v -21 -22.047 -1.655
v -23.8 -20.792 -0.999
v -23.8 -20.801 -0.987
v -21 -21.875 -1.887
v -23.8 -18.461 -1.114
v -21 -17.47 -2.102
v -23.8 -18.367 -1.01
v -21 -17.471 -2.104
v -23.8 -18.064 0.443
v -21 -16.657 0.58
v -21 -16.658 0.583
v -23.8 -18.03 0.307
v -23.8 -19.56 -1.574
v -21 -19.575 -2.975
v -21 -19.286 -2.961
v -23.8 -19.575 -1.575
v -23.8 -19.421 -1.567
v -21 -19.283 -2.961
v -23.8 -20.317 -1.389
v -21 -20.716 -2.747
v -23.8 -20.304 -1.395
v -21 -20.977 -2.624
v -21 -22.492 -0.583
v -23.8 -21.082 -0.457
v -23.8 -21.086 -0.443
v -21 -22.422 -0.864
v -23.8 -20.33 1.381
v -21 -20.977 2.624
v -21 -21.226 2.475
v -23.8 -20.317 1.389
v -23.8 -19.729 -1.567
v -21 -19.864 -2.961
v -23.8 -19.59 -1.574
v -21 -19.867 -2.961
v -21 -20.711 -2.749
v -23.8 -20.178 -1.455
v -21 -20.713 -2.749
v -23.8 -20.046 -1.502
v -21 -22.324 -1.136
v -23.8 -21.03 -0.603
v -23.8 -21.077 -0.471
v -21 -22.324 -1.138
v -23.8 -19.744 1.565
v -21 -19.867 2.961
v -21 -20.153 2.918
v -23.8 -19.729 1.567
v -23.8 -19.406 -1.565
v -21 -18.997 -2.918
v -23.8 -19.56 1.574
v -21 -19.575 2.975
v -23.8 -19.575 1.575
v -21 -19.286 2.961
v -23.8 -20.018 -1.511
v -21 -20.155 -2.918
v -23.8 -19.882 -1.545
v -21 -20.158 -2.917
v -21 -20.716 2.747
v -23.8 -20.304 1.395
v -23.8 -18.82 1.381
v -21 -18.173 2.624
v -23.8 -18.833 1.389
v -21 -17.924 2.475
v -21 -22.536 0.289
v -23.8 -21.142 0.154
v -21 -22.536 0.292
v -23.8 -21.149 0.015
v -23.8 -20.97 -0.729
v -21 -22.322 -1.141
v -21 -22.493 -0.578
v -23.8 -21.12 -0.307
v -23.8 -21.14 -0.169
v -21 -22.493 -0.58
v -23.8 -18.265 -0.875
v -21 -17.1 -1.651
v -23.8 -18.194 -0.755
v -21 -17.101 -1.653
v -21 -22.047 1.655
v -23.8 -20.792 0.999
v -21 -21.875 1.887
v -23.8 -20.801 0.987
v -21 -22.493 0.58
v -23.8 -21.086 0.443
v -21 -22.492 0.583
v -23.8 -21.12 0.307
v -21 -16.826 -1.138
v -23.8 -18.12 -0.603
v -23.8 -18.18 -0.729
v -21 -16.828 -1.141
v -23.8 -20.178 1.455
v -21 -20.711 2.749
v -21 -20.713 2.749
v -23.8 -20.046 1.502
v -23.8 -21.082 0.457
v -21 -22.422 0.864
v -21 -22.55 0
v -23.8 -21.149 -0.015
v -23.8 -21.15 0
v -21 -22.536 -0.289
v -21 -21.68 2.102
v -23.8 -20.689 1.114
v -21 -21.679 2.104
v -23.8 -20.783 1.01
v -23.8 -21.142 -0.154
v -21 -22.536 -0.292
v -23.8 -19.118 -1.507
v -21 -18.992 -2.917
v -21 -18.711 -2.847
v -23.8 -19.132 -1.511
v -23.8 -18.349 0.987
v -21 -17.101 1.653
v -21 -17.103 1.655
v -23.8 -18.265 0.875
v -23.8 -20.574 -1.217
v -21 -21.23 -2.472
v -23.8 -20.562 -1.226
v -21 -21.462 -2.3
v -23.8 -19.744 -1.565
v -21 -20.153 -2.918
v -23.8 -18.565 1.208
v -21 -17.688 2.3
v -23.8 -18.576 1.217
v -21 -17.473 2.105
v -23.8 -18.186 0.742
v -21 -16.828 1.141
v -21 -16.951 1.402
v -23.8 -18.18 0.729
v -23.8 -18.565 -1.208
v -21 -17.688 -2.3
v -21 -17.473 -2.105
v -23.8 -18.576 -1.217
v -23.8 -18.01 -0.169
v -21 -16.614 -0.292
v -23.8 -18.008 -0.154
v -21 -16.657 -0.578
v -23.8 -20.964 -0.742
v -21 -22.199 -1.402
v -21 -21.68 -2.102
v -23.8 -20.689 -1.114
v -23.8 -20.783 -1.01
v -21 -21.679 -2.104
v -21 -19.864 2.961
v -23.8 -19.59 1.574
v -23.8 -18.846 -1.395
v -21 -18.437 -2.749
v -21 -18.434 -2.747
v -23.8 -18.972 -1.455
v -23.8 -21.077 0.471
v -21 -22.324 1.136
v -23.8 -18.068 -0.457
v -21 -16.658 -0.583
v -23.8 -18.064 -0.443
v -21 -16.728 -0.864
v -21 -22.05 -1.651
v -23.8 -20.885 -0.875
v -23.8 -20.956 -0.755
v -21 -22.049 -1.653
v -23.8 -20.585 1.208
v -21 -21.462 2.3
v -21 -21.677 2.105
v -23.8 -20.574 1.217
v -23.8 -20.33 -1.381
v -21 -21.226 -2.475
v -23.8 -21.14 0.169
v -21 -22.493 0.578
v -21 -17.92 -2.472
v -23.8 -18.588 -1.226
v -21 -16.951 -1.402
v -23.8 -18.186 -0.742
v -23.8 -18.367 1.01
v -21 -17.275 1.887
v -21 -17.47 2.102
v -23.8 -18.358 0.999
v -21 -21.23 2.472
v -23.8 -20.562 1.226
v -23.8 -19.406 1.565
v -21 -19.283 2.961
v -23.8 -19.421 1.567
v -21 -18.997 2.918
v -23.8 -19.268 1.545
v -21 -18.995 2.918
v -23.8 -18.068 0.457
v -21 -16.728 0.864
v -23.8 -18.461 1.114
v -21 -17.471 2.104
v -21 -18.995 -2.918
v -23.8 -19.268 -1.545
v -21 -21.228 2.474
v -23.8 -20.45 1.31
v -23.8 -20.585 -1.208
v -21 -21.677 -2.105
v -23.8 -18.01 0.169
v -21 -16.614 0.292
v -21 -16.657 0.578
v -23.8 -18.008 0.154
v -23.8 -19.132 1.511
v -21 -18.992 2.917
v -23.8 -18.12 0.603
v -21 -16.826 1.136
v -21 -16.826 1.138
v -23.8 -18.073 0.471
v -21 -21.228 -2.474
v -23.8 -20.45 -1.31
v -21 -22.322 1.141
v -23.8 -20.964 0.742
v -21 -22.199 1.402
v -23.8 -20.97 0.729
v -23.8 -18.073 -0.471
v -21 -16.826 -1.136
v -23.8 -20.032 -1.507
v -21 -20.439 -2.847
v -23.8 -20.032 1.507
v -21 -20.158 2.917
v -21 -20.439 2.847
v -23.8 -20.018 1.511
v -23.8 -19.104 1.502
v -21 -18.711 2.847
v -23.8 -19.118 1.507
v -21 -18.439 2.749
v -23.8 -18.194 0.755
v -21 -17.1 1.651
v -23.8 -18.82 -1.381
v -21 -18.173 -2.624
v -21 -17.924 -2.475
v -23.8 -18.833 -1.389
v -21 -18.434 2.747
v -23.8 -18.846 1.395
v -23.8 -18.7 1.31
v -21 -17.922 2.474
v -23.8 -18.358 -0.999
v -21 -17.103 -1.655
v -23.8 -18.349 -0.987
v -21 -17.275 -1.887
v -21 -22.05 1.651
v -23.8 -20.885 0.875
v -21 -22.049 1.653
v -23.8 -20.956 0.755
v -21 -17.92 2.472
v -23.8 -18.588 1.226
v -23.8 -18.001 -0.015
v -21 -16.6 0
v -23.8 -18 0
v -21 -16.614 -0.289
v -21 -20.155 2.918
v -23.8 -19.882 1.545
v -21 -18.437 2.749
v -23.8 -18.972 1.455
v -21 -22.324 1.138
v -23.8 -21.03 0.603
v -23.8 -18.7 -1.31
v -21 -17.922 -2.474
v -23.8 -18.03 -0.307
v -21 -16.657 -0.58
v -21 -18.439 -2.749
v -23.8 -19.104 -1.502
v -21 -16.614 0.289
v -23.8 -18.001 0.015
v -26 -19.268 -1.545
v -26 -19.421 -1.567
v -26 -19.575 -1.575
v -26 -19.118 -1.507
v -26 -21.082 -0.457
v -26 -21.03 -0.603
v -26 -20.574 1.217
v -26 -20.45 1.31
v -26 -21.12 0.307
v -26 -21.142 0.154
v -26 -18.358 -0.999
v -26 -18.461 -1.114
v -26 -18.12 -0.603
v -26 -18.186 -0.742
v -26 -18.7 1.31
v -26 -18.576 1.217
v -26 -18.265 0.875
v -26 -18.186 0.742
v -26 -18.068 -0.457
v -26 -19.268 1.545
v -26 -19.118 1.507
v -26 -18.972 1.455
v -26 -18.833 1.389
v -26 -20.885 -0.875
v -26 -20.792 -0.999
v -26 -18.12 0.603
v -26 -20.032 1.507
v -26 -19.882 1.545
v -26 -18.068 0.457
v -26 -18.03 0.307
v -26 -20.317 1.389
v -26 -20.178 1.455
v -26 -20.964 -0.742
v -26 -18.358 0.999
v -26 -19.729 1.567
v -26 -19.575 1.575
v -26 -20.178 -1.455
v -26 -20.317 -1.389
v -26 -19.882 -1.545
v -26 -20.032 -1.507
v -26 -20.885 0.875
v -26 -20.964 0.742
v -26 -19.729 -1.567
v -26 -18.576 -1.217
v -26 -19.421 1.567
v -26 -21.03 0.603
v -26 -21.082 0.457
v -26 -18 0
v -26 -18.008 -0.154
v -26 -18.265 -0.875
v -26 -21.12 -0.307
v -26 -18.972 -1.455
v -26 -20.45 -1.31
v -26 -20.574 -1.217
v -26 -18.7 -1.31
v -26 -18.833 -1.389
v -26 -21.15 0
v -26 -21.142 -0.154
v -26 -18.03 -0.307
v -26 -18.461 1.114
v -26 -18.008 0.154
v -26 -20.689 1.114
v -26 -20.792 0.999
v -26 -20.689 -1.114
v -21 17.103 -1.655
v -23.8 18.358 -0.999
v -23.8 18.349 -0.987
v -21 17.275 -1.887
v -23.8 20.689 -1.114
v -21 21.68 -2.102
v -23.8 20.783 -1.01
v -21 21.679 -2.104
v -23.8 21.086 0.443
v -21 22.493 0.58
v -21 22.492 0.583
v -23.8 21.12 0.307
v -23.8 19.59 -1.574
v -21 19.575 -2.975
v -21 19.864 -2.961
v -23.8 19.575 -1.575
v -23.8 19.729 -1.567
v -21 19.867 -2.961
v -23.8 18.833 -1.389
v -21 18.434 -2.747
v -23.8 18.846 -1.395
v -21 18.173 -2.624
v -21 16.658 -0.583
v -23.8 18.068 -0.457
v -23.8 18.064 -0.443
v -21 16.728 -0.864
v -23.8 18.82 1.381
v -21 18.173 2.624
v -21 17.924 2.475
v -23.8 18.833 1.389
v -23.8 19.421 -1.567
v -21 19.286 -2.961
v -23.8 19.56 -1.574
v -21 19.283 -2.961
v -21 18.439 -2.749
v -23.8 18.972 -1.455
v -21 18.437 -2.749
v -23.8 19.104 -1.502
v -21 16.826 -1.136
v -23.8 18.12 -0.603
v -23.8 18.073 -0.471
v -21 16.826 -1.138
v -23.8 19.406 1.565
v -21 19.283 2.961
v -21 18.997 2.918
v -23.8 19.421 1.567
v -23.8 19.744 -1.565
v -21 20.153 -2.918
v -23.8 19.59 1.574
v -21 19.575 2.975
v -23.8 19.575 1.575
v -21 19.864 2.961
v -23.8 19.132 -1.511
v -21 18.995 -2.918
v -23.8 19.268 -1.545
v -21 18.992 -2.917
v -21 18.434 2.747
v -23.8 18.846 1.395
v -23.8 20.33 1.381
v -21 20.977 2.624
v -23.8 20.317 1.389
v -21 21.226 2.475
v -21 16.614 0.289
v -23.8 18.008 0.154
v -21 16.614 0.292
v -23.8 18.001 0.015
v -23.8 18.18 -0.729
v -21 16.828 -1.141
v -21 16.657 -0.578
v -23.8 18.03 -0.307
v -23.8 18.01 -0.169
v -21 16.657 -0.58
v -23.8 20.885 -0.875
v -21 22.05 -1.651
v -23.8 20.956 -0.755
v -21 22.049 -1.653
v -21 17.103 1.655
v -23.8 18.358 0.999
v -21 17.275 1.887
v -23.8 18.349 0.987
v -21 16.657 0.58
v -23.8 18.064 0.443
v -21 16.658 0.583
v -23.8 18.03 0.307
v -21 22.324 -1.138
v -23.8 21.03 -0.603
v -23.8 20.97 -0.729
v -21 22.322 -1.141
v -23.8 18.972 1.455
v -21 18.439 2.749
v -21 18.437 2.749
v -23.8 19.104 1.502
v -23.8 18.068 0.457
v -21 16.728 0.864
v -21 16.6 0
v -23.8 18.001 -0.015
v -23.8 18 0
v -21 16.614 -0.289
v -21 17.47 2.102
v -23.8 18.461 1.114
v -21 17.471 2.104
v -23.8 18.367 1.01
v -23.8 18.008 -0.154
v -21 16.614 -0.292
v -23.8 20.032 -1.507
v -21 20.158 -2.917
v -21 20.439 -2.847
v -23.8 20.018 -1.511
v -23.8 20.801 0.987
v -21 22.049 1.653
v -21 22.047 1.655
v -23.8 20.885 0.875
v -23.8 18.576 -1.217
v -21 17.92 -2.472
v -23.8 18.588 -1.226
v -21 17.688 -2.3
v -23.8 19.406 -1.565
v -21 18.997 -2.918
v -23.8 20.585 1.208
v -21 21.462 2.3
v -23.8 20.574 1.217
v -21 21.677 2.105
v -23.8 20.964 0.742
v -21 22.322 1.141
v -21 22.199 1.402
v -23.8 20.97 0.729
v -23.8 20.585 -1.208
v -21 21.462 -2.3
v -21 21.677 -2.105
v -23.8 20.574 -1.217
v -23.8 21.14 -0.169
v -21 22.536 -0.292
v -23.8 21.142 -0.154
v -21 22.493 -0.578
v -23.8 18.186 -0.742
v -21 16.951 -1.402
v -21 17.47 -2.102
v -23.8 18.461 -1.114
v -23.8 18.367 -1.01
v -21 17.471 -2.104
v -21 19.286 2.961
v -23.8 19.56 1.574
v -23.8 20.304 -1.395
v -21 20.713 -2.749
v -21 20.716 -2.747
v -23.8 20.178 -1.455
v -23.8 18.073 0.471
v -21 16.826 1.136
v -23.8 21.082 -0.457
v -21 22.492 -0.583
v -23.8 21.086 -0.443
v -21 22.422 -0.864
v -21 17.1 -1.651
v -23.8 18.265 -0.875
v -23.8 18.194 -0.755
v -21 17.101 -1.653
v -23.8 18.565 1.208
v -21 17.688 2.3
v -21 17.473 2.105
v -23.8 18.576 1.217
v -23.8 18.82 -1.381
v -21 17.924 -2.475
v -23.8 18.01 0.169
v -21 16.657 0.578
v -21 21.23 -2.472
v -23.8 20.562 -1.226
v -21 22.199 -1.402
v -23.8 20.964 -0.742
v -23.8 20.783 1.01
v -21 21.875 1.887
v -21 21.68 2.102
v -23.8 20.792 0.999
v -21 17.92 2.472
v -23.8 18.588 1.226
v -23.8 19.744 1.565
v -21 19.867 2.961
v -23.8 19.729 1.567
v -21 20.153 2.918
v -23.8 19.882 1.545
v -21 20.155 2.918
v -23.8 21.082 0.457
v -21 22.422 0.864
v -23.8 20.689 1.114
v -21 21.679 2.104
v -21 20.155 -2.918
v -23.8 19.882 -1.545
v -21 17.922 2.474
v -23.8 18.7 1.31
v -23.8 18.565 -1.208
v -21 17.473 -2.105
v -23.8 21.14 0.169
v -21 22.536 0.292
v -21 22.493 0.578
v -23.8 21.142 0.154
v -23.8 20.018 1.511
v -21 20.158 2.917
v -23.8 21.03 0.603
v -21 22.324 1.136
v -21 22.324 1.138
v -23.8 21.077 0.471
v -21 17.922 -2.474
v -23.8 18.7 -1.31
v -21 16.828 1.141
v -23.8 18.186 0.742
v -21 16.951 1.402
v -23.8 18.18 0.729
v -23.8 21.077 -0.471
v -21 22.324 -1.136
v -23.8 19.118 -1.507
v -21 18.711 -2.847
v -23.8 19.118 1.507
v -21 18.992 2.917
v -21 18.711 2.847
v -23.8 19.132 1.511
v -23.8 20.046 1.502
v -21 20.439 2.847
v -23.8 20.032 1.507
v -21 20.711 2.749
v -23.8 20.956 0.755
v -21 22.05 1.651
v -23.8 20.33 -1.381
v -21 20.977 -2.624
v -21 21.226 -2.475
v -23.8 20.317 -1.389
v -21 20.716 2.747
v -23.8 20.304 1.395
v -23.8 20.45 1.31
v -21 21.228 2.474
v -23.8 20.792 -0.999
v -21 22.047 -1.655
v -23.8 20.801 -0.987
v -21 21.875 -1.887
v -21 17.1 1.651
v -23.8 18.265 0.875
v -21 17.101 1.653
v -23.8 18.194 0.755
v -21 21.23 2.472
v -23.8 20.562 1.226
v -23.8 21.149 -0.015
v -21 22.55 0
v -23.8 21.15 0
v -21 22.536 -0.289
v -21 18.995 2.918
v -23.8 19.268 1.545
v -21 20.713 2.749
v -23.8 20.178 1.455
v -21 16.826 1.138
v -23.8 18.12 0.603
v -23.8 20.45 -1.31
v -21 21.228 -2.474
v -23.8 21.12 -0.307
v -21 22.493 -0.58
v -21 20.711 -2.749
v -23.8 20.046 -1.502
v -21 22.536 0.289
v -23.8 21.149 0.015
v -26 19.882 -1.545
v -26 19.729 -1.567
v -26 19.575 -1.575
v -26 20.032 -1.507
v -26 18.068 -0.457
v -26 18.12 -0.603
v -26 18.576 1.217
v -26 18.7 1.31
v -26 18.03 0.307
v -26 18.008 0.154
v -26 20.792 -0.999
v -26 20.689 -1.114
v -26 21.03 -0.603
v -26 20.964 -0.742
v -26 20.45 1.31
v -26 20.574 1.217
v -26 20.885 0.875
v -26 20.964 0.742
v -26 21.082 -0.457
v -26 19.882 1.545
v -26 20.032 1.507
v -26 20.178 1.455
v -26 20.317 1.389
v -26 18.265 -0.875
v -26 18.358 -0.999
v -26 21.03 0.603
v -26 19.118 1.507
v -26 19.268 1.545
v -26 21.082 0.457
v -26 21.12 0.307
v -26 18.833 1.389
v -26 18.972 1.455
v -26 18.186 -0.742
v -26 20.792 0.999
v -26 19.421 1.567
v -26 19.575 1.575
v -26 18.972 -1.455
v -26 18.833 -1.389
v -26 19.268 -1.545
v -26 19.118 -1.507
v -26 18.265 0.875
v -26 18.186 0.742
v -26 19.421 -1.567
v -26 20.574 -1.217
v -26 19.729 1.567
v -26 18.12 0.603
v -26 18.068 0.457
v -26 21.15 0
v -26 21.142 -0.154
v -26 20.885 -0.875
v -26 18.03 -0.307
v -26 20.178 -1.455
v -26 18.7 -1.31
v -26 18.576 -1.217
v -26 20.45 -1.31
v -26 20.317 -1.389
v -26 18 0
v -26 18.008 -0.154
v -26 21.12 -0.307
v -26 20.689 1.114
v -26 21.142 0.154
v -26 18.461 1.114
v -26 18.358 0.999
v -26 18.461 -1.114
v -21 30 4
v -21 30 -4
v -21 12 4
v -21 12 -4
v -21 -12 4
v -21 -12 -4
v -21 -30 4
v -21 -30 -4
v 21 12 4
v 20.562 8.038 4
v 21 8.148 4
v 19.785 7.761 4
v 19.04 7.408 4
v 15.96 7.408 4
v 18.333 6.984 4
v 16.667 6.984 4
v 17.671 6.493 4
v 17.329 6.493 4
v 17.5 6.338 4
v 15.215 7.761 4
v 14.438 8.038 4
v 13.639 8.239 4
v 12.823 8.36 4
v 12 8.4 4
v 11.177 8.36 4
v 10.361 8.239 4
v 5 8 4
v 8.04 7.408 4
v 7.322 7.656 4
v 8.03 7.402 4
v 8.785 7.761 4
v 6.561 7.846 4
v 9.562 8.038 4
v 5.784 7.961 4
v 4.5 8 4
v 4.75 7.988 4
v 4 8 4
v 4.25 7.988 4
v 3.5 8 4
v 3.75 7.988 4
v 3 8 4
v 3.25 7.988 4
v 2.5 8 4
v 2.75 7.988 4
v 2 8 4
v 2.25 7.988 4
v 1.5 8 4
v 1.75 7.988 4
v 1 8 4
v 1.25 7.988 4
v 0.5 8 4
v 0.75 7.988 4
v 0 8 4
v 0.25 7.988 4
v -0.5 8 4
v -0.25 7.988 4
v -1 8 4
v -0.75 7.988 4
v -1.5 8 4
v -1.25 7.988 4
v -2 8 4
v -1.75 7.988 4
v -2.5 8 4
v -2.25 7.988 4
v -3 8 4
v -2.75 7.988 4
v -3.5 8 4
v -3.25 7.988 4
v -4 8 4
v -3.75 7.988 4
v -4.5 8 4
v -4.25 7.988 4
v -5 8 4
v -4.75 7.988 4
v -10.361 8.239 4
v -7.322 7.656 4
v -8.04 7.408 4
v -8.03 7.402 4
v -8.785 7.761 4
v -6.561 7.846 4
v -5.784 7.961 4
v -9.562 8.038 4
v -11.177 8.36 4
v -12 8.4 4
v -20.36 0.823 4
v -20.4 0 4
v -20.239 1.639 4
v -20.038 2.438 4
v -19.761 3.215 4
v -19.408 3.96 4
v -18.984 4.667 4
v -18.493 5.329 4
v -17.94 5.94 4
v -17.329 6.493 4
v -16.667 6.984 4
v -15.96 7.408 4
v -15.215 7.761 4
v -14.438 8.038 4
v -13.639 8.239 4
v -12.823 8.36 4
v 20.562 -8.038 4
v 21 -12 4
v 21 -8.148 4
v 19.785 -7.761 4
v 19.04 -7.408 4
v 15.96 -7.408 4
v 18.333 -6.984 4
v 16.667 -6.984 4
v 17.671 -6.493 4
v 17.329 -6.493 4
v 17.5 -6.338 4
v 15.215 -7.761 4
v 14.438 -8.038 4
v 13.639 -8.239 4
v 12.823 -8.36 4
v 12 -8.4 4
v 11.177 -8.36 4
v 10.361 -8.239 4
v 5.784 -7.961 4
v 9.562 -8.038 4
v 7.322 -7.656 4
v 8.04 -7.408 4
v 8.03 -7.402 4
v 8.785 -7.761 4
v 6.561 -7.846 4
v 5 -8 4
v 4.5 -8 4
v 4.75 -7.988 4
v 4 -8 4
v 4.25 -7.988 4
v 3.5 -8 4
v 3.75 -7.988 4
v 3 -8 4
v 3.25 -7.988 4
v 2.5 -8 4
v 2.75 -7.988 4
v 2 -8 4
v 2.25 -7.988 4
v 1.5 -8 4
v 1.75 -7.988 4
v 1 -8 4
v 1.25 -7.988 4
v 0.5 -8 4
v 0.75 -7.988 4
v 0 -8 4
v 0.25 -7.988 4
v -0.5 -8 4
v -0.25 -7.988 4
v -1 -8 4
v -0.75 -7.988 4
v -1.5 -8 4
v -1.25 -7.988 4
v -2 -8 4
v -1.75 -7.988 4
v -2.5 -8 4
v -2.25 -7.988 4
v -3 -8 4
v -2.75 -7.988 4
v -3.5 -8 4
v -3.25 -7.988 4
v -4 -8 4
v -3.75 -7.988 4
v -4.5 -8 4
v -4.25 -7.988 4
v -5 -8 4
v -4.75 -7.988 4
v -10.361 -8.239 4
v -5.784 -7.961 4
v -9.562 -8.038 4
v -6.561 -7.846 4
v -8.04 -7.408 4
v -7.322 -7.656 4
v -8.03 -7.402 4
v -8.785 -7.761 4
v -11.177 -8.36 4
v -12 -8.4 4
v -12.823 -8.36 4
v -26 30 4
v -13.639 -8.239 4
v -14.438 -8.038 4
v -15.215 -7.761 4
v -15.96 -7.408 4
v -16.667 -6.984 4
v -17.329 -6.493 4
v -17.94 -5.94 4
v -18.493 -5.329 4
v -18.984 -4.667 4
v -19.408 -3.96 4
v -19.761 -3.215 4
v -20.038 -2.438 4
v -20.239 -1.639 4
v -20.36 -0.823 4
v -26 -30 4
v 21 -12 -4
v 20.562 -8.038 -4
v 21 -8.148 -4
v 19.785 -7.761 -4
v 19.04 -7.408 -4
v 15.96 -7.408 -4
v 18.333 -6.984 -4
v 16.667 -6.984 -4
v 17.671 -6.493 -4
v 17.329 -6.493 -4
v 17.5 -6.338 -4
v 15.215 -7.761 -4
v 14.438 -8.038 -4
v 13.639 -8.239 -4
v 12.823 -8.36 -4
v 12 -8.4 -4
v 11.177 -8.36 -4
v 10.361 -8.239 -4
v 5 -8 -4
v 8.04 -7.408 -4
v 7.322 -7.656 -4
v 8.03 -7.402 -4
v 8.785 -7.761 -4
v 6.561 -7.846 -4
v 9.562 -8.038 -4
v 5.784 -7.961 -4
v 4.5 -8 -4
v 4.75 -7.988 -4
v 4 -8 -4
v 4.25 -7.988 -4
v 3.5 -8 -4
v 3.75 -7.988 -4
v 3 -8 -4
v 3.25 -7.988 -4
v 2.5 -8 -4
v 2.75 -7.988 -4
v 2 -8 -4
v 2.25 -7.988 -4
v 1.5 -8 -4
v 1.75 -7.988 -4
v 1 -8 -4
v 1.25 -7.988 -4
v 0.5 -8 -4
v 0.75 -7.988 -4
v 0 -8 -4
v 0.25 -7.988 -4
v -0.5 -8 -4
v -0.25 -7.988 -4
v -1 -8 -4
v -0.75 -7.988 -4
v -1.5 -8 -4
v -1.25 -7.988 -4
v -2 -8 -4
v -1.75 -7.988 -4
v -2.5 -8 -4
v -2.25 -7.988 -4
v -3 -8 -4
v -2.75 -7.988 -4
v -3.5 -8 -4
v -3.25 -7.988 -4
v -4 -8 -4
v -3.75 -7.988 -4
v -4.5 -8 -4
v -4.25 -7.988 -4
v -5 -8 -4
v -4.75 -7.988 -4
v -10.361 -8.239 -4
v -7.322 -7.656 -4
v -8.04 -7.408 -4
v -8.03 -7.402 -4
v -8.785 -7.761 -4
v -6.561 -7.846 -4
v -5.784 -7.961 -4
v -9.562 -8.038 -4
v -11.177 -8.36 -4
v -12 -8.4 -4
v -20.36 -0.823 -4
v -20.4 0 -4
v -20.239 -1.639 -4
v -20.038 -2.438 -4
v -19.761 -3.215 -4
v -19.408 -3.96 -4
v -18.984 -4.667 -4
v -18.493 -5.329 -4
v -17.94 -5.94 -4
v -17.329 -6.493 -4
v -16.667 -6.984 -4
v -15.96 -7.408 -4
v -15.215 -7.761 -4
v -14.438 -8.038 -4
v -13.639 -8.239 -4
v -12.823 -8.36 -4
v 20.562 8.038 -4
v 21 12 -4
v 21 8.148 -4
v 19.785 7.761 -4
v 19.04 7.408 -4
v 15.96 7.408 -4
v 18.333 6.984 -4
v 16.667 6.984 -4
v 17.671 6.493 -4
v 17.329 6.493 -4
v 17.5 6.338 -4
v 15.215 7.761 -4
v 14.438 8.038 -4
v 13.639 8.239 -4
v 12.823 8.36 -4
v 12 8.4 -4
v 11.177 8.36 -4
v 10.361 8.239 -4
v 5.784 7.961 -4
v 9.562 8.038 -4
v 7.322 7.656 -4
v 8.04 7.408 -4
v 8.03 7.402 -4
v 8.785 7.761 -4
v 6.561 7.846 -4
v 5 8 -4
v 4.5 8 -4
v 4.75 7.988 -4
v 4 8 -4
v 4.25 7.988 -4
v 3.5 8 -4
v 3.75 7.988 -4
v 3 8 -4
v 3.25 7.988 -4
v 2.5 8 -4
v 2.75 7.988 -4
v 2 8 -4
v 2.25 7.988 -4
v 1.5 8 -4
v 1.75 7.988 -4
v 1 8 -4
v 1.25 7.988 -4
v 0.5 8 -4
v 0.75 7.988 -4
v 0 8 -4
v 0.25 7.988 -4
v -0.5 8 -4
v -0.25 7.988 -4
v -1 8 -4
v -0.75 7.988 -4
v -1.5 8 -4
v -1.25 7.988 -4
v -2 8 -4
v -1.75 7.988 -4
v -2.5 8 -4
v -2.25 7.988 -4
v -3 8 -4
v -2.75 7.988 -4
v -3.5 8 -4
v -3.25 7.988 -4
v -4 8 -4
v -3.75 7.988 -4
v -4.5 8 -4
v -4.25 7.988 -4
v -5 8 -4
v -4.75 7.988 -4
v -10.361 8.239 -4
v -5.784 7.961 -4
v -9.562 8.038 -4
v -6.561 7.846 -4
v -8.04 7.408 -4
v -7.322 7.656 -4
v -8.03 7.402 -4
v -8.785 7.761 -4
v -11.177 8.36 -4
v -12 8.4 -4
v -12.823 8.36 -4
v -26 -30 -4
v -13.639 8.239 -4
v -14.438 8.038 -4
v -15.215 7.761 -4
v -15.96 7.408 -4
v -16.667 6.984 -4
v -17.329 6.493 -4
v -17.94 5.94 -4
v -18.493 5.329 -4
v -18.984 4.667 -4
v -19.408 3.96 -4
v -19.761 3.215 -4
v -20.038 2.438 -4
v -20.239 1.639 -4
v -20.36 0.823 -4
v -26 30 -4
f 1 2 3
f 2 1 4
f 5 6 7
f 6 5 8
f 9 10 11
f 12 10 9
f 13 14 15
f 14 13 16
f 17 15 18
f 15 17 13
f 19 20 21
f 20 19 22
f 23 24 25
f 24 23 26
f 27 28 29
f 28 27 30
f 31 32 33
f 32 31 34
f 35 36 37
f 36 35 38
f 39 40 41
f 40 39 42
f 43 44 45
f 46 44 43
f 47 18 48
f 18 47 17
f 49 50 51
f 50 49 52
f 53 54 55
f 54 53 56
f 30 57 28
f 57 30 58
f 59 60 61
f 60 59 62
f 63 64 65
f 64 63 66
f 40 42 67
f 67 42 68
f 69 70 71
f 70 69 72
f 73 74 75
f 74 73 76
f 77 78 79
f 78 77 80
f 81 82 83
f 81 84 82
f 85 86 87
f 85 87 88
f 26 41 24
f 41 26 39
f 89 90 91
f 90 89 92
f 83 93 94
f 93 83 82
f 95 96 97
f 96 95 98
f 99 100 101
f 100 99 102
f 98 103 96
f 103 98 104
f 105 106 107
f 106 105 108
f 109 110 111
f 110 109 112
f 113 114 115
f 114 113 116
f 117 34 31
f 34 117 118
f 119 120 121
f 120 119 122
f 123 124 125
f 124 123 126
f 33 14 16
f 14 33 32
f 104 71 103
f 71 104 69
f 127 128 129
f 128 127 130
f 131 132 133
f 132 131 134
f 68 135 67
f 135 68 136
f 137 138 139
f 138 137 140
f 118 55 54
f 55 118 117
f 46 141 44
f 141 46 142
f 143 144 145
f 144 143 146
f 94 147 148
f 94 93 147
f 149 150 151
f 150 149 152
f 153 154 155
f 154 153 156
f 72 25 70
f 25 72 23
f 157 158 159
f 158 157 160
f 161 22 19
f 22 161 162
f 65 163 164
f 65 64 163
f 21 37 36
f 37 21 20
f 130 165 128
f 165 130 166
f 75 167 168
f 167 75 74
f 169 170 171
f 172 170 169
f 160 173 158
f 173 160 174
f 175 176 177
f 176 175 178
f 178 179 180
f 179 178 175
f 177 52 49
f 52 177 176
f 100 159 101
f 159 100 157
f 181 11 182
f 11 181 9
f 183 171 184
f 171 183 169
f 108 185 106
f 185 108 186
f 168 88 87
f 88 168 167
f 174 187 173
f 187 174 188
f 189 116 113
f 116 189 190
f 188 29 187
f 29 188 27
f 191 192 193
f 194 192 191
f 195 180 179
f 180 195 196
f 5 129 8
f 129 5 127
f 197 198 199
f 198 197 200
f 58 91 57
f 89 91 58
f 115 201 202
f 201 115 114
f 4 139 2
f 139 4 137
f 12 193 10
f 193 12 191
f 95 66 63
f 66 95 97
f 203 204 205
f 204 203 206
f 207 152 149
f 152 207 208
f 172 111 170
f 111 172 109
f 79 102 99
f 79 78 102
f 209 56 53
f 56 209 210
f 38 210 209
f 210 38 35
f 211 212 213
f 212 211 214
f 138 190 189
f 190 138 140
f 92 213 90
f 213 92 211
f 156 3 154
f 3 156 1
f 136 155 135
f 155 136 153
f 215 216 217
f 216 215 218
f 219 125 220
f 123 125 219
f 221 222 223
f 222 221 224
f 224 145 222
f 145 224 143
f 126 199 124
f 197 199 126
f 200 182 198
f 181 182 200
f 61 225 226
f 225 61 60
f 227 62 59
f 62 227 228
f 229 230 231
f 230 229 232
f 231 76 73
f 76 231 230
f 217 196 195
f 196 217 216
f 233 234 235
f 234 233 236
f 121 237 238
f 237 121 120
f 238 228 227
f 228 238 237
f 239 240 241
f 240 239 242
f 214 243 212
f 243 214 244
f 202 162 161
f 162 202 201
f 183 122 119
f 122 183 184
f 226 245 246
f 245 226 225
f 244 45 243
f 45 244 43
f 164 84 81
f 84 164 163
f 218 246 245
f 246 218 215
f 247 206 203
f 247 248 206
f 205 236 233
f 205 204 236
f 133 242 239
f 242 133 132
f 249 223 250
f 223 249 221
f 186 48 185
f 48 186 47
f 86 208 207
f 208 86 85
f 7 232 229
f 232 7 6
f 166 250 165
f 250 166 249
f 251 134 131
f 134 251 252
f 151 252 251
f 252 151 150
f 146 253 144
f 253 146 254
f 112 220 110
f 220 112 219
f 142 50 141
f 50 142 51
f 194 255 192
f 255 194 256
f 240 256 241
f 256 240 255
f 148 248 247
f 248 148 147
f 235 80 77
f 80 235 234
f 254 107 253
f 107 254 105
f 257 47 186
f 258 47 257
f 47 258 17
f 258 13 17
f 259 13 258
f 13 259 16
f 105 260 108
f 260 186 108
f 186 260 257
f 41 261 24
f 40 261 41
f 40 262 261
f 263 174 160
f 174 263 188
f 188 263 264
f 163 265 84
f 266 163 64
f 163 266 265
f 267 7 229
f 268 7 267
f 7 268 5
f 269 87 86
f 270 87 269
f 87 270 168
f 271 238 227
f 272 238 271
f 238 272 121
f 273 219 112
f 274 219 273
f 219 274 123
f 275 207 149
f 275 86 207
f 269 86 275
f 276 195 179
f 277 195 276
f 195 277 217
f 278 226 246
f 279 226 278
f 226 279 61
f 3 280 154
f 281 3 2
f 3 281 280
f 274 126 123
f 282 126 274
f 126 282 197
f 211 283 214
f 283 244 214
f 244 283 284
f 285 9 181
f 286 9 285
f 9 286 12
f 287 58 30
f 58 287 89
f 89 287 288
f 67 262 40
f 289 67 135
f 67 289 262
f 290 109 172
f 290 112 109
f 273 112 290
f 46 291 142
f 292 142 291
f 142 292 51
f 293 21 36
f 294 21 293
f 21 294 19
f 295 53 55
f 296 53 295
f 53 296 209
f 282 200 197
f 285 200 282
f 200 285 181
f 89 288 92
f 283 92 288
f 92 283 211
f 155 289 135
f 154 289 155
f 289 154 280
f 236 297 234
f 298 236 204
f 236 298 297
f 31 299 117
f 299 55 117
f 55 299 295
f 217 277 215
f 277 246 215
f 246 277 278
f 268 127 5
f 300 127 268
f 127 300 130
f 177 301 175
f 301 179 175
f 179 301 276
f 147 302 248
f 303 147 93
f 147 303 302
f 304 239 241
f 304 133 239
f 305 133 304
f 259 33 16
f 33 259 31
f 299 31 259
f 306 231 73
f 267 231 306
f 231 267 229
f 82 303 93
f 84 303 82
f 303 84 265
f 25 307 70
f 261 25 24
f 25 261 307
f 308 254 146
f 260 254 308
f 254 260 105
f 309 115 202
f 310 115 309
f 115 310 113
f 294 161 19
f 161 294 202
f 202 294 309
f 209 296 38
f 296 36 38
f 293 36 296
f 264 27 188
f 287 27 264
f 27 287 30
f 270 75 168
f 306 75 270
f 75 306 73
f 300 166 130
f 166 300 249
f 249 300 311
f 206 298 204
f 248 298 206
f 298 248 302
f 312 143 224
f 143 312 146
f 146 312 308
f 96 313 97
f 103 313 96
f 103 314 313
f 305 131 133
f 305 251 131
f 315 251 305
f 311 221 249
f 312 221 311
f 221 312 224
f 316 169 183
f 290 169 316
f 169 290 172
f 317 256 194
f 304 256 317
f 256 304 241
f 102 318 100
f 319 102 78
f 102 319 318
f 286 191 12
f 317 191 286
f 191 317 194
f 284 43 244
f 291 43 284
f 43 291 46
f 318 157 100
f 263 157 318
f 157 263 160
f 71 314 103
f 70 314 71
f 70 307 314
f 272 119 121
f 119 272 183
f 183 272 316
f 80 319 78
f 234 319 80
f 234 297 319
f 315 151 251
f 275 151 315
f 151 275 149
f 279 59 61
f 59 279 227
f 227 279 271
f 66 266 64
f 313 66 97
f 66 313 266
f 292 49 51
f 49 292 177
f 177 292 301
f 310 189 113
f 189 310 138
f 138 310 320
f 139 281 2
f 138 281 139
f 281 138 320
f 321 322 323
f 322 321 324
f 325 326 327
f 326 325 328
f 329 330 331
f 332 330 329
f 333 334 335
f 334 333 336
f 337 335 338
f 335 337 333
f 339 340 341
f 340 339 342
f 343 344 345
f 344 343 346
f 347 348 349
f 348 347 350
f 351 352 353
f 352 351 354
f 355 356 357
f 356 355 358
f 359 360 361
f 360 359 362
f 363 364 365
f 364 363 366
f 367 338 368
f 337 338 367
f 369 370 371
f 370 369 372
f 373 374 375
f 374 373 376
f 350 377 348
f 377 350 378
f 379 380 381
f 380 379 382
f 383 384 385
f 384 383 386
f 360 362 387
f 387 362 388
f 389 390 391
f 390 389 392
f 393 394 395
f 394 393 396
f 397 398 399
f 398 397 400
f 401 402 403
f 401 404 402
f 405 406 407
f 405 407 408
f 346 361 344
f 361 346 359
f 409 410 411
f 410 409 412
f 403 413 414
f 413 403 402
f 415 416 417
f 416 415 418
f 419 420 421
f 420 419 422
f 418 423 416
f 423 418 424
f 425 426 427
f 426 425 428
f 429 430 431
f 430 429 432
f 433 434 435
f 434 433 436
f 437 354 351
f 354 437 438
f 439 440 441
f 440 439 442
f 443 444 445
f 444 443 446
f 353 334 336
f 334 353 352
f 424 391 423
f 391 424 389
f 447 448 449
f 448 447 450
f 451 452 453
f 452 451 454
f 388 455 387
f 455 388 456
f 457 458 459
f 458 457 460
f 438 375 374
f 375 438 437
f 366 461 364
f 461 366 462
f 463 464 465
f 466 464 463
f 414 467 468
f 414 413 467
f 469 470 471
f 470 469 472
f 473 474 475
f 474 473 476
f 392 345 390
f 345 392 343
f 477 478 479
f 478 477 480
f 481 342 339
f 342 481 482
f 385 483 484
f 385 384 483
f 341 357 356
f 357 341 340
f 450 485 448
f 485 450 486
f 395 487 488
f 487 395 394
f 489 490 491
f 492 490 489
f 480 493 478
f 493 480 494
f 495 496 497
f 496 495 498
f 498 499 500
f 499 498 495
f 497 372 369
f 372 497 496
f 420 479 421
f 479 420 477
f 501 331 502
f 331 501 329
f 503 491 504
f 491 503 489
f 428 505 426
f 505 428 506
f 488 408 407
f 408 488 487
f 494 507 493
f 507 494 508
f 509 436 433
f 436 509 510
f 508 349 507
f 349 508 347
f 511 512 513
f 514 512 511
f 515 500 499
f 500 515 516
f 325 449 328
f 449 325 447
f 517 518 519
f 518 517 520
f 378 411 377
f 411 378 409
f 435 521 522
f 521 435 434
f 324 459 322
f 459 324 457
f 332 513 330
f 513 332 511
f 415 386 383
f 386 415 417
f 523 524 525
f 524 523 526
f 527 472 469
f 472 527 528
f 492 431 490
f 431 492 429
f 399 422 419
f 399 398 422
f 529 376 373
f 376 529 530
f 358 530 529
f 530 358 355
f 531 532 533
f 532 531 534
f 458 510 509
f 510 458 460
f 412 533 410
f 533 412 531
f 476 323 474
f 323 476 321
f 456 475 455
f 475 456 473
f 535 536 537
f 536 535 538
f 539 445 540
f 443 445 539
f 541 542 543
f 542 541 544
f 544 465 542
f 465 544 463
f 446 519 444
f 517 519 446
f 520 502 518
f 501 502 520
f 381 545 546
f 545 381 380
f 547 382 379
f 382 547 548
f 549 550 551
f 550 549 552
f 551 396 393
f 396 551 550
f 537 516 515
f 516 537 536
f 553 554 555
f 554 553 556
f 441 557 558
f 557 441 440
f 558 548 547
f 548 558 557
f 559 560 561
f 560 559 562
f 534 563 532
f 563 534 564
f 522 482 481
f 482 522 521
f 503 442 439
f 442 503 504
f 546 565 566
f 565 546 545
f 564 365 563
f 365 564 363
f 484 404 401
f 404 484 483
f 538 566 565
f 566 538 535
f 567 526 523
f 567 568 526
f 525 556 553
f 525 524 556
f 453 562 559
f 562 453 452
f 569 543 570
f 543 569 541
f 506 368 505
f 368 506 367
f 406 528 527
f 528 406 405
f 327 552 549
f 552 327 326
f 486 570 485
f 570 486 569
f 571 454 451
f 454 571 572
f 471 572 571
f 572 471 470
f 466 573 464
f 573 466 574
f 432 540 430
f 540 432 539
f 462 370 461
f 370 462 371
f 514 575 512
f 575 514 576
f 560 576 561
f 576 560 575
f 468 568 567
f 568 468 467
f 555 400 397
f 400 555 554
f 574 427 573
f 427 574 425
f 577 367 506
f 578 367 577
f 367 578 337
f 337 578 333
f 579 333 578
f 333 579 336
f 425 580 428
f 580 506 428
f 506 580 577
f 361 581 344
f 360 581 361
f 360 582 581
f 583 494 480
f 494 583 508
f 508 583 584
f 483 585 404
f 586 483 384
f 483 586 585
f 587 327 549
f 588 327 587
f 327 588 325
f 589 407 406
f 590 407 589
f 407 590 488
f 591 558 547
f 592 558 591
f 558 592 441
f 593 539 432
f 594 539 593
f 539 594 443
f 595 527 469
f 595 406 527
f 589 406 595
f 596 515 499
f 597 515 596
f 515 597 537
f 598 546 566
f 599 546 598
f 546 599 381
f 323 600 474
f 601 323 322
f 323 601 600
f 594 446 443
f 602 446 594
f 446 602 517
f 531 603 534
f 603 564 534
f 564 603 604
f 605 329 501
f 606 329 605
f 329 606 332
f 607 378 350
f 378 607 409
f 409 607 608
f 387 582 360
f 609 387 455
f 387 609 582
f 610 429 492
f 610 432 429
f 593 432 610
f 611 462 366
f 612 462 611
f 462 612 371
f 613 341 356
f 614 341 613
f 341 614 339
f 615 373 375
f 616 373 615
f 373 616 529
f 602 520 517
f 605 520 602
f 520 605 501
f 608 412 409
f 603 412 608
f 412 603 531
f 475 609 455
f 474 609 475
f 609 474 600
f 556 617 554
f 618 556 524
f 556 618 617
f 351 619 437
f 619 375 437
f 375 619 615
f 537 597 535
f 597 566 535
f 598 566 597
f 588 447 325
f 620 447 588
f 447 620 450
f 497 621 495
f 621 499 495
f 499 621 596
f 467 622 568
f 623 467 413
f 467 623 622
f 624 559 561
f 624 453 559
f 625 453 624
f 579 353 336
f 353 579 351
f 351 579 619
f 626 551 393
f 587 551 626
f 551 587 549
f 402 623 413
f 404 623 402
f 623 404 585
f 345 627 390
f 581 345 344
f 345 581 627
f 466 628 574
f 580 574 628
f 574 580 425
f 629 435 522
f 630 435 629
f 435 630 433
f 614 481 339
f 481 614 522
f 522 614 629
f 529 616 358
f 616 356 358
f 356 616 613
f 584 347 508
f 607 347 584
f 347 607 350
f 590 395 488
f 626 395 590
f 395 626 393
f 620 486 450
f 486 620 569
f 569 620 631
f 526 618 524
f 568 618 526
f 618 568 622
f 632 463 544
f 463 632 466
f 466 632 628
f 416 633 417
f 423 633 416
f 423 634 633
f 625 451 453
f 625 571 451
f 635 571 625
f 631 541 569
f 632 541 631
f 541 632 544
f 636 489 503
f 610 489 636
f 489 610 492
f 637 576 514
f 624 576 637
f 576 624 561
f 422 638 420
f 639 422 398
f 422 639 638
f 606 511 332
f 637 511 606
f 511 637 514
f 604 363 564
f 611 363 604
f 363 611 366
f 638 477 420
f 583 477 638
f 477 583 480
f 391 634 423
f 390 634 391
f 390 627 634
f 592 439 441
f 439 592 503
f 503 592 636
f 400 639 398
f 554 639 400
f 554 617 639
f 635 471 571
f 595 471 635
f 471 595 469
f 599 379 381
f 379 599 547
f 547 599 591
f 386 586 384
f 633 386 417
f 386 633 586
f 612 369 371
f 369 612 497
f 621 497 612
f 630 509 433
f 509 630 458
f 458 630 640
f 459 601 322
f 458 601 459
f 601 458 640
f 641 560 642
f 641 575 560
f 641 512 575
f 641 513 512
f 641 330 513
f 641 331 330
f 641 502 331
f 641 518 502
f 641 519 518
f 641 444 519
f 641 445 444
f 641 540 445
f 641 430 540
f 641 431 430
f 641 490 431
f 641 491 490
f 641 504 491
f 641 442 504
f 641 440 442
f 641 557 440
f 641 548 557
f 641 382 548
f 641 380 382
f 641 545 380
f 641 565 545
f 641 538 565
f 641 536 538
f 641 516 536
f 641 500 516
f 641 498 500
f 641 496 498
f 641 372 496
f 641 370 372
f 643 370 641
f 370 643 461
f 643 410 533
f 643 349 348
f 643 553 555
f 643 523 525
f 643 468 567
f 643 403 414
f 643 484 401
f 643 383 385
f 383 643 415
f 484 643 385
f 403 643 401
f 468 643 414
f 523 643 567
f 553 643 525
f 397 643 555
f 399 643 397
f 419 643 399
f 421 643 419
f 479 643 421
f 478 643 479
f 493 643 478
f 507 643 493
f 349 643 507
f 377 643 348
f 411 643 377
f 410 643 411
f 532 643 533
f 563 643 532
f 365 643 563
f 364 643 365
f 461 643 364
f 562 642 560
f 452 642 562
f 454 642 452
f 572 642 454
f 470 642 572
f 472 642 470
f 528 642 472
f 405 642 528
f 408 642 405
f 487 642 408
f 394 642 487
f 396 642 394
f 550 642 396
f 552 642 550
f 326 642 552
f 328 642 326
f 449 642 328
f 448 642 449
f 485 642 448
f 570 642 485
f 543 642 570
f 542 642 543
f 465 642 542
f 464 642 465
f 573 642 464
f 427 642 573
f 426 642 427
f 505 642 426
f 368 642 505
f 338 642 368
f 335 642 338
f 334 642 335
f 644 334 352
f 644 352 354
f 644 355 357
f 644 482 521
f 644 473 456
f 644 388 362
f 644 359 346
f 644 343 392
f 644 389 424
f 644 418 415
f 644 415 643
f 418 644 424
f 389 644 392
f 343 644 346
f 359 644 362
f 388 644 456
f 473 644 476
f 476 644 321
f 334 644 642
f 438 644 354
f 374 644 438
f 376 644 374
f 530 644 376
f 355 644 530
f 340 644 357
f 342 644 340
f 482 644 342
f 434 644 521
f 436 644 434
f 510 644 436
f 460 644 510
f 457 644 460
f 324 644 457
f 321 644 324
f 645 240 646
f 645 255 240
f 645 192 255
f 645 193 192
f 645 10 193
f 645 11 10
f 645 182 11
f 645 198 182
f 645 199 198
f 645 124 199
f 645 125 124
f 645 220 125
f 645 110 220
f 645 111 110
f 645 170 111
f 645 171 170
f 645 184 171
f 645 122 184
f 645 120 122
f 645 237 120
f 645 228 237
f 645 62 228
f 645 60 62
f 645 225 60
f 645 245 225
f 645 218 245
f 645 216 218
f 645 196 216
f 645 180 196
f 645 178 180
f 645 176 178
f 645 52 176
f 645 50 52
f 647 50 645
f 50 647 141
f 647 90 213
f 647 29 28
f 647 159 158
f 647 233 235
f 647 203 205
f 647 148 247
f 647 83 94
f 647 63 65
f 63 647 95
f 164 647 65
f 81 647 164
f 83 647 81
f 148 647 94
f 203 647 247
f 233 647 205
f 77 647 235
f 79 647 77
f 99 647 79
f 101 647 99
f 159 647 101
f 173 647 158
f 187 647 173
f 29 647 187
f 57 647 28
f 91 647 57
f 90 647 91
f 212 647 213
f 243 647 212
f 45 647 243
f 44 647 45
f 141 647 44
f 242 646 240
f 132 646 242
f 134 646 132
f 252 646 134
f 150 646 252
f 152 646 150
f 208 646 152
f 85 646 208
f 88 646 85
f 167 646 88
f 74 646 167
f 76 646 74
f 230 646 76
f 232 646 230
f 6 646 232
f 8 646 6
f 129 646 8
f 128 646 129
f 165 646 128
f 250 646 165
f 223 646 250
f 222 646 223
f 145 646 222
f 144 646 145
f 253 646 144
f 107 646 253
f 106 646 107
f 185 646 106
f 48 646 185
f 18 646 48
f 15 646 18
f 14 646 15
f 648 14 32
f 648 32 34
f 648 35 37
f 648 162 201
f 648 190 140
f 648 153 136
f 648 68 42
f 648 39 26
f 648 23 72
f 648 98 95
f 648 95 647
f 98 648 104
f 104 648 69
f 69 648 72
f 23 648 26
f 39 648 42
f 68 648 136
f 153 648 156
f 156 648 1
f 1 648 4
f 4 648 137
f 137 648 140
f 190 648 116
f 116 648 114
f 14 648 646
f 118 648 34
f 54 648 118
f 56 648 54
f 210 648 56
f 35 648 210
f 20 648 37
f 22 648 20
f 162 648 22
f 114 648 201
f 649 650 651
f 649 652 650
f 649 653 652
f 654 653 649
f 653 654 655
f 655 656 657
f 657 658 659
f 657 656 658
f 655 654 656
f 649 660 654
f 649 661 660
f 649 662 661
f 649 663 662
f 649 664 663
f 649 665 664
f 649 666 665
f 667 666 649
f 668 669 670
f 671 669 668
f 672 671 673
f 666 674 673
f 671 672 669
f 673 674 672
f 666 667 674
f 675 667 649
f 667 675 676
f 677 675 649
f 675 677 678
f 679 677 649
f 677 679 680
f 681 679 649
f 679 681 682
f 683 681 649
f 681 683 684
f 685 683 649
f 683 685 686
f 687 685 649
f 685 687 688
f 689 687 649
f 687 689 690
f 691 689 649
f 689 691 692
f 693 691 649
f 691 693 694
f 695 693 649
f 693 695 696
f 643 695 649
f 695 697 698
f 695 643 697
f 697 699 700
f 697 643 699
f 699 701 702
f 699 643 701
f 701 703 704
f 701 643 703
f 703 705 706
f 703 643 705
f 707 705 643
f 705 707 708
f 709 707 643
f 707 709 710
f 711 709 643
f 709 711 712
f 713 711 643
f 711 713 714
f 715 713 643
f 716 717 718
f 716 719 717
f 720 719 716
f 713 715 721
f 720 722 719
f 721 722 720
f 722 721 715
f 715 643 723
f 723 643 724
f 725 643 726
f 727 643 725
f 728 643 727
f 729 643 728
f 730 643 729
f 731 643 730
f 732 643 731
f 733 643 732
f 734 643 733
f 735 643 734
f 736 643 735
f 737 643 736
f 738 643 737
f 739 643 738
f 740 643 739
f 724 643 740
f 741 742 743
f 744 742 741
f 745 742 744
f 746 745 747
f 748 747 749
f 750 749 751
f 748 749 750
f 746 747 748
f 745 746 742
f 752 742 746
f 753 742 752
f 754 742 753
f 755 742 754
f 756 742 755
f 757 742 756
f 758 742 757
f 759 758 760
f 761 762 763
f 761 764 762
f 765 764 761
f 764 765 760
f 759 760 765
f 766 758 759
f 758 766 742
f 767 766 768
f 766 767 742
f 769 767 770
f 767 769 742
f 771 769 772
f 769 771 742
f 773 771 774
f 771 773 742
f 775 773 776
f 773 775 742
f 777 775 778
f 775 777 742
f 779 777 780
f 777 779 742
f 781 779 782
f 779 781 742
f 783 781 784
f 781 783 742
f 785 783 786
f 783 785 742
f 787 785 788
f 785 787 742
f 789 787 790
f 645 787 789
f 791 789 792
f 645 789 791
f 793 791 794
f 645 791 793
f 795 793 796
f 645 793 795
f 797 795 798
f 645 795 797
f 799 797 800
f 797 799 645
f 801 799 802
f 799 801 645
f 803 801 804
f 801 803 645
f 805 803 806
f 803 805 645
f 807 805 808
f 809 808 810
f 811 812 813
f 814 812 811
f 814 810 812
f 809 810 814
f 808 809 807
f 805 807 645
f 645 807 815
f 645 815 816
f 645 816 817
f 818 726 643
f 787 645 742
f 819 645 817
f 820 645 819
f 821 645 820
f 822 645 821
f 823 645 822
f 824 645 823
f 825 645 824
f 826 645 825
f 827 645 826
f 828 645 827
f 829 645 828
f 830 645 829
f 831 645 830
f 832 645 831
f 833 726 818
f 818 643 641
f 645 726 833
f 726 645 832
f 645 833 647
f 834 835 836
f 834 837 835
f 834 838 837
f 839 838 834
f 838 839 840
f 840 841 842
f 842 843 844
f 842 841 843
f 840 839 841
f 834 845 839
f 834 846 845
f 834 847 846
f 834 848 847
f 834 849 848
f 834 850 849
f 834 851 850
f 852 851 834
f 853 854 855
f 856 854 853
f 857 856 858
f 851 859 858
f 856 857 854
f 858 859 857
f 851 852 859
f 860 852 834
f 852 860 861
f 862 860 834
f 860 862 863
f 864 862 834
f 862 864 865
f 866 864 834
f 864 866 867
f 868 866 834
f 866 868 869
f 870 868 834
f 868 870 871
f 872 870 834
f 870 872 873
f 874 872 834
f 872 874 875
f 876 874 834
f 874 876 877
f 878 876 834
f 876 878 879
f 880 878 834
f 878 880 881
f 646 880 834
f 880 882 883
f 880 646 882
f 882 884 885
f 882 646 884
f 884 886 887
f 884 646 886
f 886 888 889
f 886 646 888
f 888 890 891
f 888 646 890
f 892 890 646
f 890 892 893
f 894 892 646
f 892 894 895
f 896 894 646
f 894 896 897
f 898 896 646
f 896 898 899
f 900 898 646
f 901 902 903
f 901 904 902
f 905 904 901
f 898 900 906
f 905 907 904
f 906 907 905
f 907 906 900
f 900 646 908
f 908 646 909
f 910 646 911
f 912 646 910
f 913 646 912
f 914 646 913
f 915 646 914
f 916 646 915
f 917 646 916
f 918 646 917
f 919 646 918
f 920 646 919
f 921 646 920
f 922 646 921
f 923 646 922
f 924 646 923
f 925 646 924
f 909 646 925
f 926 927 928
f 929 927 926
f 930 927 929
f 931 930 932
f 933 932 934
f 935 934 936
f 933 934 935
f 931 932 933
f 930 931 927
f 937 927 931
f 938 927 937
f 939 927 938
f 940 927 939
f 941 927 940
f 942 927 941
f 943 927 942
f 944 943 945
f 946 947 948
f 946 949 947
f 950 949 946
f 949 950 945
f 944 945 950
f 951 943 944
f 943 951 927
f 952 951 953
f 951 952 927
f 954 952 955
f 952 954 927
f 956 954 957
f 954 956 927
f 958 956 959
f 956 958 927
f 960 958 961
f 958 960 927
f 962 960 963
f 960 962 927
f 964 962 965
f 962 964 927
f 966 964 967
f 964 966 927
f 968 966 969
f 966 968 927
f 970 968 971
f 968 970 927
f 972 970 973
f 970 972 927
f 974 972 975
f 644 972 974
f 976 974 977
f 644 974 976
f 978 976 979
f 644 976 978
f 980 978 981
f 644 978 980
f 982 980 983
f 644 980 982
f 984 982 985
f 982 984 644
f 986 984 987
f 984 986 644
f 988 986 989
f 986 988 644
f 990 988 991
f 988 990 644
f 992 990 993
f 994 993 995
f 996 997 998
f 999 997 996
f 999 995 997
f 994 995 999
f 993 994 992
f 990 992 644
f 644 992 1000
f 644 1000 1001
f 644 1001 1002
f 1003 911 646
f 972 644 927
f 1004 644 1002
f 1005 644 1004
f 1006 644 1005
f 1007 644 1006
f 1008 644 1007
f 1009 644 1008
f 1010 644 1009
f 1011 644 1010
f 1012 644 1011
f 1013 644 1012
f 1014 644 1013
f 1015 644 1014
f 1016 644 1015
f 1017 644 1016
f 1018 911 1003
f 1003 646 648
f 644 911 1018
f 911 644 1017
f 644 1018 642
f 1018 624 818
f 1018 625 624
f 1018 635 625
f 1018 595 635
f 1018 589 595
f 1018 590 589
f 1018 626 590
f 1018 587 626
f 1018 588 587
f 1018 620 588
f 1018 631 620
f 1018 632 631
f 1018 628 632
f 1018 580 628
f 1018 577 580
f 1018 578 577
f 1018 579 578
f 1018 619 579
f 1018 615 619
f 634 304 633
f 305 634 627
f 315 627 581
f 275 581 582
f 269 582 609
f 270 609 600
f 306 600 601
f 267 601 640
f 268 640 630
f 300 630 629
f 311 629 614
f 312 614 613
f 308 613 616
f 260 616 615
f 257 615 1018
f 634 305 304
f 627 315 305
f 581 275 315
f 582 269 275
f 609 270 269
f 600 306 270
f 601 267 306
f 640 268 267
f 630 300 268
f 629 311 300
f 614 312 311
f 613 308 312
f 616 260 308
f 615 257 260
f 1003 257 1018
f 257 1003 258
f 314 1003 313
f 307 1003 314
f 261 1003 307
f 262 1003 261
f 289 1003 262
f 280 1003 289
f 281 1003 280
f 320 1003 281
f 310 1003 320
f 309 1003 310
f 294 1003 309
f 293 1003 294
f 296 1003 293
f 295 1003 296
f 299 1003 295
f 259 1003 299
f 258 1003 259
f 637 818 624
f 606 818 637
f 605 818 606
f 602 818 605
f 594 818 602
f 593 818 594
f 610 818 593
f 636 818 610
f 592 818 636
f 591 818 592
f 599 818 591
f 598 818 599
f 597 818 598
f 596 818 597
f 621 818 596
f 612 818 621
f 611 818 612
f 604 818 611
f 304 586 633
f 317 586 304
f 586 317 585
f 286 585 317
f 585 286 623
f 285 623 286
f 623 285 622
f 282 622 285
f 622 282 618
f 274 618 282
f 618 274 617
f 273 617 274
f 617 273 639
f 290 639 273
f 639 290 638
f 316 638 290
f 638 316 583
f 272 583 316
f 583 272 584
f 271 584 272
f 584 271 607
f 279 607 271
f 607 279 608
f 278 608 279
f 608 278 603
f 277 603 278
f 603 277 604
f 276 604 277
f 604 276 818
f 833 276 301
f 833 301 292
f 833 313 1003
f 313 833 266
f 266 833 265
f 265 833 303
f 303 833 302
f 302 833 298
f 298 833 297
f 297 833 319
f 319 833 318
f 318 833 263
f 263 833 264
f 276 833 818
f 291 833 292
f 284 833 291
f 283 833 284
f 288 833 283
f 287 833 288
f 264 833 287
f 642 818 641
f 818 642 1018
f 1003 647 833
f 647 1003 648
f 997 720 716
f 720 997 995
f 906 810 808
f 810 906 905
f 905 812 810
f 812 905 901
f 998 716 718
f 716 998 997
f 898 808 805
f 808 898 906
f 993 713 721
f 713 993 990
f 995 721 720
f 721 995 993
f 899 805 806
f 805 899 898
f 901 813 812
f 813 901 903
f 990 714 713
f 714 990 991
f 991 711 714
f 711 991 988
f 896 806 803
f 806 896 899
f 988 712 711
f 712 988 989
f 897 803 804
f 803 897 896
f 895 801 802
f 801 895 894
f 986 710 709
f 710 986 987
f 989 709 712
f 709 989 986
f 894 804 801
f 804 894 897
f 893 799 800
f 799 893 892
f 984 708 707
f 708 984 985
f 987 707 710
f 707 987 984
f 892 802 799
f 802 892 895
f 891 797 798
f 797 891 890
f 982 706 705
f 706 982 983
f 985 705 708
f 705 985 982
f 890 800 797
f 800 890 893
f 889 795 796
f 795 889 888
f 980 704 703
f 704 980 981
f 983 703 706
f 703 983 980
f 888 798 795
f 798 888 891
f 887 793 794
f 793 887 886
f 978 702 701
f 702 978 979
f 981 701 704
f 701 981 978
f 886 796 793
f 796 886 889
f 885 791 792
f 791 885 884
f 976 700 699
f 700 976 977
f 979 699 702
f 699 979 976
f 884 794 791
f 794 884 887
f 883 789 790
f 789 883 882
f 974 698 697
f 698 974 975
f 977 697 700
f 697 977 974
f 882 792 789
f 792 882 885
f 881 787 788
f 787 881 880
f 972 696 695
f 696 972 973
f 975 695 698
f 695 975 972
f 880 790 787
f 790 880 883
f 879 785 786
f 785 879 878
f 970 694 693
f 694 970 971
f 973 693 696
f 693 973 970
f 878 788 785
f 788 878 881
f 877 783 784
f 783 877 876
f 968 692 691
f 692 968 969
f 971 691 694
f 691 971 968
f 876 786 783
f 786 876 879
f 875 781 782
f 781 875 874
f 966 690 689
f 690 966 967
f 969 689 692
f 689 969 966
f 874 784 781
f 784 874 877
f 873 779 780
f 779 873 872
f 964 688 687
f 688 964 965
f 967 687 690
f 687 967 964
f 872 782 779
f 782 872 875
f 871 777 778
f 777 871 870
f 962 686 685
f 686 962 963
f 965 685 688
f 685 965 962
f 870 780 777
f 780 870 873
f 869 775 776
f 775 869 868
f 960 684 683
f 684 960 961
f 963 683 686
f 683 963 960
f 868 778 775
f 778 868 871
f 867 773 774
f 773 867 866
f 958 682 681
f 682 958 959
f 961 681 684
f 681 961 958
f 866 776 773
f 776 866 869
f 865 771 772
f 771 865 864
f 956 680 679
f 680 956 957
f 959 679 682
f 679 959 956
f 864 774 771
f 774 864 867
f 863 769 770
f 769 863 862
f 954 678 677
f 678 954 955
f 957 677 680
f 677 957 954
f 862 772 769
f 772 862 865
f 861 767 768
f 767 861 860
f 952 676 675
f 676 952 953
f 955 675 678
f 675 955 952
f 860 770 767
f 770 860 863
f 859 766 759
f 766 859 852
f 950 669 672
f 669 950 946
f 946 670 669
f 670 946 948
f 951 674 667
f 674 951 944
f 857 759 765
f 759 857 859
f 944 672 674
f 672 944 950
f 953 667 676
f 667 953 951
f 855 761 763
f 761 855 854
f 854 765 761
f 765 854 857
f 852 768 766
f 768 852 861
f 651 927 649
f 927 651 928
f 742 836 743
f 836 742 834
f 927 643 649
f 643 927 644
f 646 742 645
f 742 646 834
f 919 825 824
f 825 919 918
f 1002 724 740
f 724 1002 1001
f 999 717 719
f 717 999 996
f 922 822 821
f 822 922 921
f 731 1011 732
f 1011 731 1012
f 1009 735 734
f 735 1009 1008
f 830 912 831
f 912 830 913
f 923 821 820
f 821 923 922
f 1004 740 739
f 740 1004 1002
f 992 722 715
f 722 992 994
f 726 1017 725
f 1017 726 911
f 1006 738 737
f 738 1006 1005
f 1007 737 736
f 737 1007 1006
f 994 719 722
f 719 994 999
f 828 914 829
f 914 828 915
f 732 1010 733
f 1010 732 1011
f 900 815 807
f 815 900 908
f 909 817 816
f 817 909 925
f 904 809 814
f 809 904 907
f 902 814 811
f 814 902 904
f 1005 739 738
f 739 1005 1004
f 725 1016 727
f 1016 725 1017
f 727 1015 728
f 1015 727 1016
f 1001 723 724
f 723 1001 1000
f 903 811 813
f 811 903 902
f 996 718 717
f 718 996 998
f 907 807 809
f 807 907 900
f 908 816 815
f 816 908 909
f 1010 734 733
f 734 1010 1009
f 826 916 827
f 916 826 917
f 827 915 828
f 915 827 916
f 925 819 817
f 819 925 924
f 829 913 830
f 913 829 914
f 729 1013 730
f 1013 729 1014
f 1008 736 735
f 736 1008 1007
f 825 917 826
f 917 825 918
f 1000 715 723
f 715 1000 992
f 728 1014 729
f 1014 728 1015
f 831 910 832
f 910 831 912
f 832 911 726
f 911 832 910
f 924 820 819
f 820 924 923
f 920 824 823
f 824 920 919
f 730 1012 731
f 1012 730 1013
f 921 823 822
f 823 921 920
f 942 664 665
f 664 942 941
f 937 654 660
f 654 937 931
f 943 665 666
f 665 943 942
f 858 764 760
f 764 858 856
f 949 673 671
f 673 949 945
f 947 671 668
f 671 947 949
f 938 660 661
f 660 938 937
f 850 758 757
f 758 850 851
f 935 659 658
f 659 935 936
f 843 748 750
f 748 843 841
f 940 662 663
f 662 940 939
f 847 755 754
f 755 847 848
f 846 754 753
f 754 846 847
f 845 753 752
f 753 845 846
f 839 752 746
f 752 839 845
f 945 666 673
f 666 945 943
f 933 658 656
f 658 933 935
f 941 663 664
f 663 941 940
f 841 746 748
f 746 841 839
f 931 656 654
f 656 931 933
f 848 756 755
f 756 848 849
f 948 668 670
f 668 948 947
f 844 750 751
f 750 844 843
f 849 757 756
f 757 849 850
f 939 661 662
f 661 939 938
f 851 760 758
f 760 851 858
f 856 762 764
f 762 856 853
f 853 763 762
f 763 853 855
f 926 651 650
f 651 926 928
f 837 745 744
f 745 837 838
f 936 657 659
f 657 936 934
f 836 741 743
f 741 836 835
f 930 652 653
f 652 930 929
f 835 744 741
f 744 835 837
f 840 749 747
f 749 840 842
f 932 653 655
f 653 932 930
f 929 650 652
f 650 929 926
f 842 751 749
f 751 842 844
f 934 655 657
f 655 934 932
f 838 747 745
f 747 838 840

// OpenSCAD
padding = 5;
thickness = 8;
mc = 0.1;
grow = 1.05;
l = 40;
d = 16;
hole_dia = 3;
$fn=64;

mount_len = 2.5*(d+thickness);

echo("Mount length", mount_len);

module grill_mount() {
    
    
    space_for_mount = mount_len/2 - (d+thickness)/2;
    hole_pos = space_for_mount; // + space_for_mount/2;
    difference() {
        translate([-l/2-padding/2-1, 0, 0])
            cube([padding, mount_len, thickness], center=true);
        translate([-l/2-(padding)/2-1, -hole_pos-(hole_dia*grow)/2, 0])
            rotate([0, 90, 0])
                screw();
        translate([-l/2-(padding)/2-1, hole_pos+(hole_dia*grow)/2, 0])
            rotate([0, 90, 0])
                screw();
    }
    difference() {
        cube([l*grow, d+thickness, thickness], center=true);
        translate([-(l/2-d/2), 0, 0])
            cylinder(h=thickness+mc, d=d*grow, center=true);   
        translate([(l/2-d/2), 0, 0])
            cylinder(h=thickness+mc, d=d*grow, center=true);   
        translate([(l/2+3), 0, 0])
            cylinder(h=thickness+mc, d=d*grow, center=true);   
        union() {
            for(i=[(-d/2+3):0.5:(d/2-3)]) {
                translate([i, 0, 0])
                    cylinder(h=thickness+mc, d=d, center=true);   
            }
        }
    }
}

module enforcement() {
    difference() {
        cube([thickness, thickness, thickness], center=true);
        translate([thickness/2, -thickness/2, 0])
            cylinder(h=thickness+mc, r=thickness, center=true); 
    }
}

module screw() {
    union() {
        translate([0, 0, (padding+mc)/2-(3/2)])
        cylinder(h=3, d1=hole_dia, d2=hole_dia*2, center=true);
        cylinder(h=padding+mc, d=hole_dia*grow, center=true);
    }
}

//enforcement();
//screw();
grill_mount();
